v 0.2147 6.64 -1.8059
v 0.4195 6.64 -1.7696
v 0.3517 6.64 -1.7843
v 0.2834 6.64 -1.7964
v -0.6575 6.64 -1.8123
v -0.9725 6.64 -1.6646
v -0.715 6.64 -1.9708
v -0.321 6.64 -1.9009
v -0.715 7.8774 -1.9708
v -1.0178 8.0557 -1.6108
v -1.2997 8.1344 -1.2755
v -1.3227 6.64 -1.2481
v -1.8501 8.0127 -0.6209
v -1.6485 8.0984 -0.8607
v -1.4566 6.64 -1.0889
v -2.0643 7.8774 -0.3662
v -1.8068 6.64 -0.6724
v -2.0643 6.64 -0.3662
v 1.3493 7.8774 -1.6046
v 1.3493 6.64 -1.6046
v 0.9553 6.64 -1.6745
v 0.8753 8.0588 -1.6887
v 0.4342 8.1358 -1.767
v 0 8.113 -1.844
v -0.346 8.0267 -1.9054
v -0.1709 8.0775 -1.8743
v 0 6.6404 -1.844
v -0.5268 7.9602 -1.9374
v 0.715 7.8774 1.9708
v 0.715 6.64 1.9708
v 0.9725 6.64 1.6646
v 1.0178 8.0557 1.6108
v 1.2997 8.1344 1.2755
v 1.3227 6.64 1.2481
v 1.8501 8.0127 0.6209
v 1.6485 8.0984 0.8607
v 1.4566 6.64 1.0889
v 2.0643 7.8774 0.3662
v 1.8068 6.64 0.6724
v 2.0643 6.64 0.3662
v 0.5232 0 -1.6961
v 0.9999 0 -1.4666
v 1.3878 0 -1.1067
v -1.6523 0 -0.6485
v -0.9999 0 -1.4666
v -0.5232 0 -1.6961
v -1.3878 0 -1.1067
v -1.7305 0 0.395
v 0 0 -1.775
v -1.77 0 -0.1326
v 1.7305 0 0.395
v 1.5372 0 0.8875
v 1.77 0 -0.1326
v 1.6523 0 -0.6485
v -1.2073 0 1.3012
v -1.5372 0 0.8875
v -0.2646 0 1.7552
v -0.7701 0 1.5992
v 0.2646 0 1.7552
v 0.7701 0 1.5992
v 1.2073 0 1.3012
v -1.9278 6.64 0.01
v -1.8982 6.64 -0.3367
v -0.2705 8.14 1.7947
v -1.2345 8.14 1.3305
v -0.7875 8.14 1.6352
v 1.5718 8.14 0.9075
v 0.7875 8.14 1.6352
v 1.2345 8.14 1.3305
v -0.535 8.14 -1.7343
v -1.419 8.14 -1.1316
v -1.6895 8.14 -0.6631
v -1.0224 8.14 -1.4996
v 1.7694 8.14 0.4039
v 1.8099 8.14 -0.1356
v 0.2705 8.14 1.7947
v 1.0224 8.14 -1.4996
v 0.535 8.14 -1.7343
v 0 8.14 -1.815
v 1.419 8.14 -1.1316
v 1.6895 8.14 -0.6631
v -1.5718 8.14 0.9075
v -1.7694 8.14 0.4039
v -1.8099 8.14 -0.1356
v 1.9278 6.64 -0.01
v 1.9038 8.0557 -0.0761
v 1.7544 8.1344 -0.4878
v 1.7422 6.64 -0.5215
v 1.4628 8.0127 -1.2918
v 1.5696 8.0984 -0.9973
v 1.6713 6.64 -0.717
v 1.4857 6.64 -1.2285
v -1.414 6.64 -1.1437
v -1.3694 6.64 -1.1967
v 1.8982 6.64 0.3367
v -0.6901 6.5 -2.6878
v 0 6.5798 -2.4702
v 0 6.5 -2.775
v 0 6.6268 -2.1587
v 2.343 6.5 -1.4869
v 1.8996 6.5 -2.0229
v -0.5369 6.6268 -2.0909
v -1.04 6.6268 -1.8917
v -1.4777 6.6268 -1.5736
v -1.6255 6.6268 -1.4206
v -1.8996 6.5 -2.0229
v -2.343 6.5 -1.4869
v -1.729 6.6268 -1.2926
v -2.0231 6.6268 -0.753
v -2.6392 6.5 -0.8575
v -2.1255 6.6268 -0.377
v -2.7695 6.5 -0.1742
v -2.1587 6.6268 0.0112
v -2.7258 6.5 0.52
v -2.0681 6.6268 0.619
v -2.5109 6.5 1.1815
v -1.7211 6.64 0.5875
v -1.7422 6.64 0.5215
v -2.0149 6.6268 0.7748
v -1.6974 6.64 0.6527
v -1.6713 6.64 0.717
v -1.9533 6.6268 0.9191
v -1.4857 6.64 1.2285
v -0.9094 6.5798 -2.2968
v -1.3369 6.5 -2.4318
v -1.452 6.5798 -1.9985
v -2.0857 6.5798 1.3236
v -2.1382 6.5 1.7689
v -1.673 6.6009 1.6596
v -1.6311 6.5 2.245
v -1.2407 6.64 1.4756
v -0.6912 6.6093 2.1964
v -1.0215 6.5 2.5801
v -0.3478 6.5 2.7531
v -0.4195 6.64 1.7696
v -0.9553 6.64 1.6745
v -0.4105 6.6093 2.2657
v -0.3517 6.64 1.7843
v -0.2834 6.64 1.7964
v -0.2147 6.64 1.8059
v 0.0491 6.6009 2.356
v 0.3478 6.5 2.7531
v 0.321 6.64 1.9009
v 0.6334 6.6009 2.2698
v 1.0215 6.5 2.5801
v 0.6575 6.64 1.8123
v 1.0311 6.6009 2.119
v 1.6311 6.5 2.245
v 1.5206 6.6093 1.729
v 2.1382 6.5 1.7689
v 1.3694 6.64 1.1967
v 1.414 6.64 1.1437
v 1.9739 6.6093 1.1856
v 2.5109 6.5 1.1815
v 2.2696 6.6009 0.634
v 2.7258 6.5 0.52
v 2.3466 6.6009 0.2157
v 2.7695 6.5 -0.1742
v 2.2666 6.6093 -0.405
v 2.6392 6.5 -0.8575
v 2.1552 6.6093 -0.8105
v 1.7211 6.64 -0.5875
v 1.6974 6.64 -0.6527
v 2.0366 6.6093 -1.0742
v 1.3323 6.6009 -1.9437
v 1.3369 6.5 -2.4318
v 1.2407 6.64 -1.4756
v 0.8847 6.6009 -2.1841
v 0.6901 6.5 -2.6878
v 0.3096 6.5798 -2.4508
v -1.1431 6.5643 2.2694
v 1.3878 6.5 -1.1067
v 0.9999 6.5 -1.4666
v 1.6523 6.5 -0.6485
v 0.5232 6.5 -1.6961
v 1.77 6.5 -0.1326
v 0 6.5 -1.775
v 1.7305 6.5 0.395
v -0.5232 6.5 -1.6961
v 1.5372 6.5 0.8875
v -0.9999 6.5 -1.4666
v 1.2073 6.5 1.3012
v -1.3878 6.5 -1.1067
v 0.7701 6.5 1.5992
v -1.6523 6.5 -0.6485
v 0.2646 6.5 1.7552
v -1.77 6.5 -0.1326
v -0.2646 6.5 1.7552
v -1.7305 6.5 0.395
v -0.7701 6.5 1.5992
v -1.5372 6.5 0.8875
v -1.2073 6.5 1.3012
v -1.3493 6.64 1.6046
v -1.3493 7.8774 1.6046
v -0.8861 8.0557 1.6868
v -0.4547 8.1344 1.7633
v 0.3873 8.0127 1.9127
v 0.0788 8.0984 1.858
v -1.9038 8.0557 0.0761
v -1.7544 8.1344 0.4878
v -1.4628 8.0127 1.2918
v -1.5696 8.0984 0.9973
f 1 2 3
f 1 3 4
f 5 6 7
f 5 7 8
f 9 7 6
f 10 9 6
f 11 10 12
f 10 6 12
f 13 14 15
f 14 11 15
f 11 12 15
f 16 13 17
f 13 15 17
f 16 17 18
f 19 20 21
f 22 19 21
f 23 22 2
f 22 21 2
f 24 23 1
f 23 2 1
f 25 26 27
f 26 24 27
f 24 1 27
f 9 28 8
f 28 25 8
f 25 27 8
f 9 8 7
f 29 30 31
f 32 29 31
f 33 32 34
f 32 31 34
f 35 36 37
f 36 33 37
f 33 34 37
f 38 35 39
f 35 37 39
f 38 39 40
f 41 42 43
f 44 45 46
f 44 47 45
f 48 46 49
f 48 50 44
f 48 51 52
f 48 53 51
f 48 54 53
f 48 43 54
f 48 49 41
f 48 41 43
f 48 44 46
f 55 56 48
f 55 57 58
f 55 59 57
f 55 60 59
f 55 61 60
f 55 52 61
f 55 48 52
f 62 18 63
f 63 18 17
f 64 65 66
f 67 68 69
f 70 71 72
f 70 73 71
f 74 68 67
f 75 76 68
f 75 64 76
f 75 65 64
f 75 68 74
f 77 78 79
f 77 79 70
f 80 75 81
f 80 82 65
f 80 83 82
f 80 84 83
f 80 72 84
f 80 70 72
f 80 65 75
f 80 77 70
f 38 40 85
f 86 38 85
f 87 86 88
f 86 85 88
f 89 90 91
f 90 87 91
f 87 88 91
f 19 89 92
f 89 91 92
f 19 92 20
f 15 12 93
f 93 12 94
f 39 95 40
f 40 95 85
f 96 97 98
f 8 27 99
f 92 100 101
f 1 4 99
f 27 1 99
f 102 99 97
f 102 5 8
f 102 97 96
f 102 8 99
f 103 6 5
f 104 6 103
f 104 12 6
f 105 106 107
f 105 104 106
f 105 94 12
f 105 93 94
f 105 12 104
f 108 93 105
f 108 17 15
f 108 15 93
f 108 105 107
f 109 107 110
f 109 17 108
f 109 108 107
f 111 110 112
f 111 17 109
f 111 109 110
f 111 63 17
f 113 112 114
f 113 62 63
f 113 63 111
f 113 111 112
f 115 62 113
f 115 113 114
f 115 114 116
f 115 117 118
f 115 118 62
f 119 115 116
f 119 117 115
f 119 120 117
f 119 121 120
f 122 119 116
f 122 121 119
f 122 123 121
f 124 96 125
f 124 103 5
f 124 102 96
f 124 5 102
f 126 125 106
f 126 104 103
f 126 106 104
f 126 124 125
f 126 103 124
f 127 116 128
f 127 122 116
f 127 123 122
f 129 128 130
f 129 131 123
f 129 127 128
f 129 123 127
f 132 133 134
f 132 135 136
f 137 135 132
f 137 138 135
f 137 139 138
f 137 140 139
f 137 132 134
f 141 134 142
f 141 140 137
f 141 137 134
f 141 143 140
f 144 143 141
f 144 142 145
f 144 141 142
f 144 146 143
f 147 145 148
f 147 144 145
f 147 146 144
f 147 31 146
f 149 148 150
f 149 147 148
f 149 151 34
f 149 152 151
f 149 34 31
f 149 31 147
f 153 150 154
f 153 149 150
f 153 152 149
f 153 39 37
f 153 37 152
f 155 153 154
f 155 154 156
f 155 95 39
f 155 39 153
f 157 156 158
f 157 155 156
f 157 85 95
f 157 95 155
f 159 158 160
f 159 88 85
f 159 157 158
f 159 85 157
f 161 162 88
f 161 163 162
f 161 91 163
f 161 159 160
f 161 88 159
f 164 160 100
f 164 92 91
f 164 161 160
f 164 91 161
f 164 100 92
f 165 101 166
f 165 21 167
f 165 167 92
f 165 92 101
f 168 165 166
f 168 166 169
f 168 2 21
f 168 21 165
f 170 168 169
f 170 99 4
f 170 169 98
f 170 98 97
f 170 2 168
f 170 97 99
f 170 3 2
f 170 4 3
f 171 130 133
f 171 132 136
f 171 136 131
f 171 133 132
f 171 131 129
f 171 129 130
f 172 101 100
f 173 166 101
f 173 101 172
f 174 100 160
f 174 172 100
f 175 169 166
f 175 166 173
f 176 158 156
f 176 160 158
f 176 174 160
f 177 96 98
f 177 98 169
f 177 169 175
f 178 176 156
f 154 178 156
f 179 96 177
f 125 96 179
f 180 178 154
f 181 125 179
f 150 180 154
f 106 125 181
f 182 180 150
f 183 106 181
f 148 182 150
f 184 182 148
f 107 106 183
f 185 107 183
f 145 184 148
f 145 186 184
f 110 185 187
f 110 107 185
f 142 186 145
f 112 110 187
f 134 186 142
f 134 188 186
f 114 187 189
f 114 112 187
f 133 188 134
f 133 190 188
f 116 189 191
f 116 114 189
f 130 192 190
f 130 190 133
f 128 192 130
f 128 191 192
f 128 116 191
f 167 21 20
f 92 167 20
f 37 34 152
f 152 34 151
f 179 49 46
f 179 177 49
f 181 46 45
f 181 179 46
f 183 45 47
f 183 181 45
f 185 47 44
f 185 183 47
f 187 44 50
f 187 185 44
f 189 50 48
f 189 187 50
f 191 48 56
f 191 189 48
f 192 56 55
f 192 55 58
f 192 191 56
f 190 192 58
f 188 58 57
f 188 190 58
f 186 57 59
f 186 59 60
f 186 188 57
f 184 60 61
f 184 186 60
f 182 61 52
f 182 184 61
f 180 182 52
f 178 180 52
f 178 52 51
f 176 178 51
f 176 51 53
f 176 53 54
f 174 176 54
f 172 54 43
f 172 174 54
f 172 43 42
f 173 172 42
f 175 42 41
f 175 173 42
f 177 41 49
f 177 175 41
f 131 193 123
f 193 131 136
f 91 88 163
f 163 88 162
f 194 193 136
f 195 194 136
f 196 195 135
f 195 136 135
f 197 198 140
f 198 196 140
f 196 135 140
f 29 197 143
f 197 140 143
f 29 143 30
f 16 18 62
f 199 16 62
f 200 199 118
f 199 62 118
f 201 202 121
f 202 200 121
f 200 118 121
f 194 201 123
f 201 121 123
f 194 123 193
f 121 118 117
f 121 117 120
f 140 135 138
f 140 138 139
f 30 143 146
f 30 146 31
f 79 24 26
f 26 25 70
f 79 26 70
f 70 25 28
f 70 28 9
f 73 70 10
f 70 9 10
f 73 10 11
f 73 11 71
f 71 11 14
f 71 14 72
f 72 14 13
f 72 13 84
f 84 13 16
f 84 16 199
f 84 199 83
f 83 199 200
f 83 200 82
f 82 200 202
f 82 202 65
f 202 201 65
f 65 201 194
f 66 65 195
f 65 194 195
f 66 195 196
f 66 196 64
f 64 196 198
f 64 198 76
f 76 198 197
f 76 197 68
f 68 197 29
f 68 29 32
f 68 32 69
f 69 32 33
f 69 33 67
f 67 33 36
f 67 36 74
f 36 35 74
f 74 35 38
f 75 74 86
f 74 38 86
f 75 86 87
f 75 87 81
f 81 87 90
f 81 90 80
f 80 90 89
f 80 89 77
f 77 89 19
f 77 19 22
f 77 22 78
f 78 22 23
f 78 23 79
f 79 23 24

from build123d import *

# Parameters (mm, degrees)
BOSS_EXTRUDE1_DEPTH = 1.5


with BuildPart() as part:
    # Sketch1 → Revolve1 (revolve)
    with BuildSketch(Plane.XY, mode=Mode.PRIVATE) as revolve1_sk:
        with BuildLine():
            Line((0, 0), (1.775, 0))
            Line((1.775, 0), (1.775, 6.5))
            Line((1.775, 6.5), (2.775, 6.5))
            ThreePointArc((2.775, 6.5), (2.302554278, 6.609277193), (1.818611947, 6.640038943))
            Line((1.818611947, 6.640038943), (0, 6.640038943))
            Line((0, 6.640038943), (0, 0))
        make_face()
    revolve(revolve1_sk.sketch.rotate(Axis((0, 0, 0), (0, 1, 0)), 90), axis=Axis((0, 0, 0), (0, 1, 0)))

    # Sketch2 → Boss-Extrude1 (add)
    with BuildSketch(Plane(origin=(0, 6.640038943, 0), x_dir=(1, 0, 0), z_dir=(0, 1, 0))):
        Polygon((1.349267315, 1.604637118), (-0.71502285, 1.97081833), (-2.064290165, 0.366181213), (-1.349267315, -1.604637118), (0.71502285, -1.97081833), (2.064290165, -0.366181213), align=None)
    extrude(amount=BOSS_EXTRUDE1_DEPTH)

    # Sketch3 → Cut-Revolve1 (revolve, cut)
    with BuildSketch(Plane.XY, mode=Mode.PRIVATE) as cut_revolve1_sk:
        Polygon((1.11158303, 8.796006759), (2.422382115, 7.573543033), (2.422382115, 8.796006759), align=None)
    revolve(cut_revolve1_sk.sketch.rotate(Axis((0, 0, 0), (0, 1, 0)), 90), axis=Axis((0, 0, 0), (0, 1, 0)), mode=Mode.SUBTRACT)


solid = part.part
